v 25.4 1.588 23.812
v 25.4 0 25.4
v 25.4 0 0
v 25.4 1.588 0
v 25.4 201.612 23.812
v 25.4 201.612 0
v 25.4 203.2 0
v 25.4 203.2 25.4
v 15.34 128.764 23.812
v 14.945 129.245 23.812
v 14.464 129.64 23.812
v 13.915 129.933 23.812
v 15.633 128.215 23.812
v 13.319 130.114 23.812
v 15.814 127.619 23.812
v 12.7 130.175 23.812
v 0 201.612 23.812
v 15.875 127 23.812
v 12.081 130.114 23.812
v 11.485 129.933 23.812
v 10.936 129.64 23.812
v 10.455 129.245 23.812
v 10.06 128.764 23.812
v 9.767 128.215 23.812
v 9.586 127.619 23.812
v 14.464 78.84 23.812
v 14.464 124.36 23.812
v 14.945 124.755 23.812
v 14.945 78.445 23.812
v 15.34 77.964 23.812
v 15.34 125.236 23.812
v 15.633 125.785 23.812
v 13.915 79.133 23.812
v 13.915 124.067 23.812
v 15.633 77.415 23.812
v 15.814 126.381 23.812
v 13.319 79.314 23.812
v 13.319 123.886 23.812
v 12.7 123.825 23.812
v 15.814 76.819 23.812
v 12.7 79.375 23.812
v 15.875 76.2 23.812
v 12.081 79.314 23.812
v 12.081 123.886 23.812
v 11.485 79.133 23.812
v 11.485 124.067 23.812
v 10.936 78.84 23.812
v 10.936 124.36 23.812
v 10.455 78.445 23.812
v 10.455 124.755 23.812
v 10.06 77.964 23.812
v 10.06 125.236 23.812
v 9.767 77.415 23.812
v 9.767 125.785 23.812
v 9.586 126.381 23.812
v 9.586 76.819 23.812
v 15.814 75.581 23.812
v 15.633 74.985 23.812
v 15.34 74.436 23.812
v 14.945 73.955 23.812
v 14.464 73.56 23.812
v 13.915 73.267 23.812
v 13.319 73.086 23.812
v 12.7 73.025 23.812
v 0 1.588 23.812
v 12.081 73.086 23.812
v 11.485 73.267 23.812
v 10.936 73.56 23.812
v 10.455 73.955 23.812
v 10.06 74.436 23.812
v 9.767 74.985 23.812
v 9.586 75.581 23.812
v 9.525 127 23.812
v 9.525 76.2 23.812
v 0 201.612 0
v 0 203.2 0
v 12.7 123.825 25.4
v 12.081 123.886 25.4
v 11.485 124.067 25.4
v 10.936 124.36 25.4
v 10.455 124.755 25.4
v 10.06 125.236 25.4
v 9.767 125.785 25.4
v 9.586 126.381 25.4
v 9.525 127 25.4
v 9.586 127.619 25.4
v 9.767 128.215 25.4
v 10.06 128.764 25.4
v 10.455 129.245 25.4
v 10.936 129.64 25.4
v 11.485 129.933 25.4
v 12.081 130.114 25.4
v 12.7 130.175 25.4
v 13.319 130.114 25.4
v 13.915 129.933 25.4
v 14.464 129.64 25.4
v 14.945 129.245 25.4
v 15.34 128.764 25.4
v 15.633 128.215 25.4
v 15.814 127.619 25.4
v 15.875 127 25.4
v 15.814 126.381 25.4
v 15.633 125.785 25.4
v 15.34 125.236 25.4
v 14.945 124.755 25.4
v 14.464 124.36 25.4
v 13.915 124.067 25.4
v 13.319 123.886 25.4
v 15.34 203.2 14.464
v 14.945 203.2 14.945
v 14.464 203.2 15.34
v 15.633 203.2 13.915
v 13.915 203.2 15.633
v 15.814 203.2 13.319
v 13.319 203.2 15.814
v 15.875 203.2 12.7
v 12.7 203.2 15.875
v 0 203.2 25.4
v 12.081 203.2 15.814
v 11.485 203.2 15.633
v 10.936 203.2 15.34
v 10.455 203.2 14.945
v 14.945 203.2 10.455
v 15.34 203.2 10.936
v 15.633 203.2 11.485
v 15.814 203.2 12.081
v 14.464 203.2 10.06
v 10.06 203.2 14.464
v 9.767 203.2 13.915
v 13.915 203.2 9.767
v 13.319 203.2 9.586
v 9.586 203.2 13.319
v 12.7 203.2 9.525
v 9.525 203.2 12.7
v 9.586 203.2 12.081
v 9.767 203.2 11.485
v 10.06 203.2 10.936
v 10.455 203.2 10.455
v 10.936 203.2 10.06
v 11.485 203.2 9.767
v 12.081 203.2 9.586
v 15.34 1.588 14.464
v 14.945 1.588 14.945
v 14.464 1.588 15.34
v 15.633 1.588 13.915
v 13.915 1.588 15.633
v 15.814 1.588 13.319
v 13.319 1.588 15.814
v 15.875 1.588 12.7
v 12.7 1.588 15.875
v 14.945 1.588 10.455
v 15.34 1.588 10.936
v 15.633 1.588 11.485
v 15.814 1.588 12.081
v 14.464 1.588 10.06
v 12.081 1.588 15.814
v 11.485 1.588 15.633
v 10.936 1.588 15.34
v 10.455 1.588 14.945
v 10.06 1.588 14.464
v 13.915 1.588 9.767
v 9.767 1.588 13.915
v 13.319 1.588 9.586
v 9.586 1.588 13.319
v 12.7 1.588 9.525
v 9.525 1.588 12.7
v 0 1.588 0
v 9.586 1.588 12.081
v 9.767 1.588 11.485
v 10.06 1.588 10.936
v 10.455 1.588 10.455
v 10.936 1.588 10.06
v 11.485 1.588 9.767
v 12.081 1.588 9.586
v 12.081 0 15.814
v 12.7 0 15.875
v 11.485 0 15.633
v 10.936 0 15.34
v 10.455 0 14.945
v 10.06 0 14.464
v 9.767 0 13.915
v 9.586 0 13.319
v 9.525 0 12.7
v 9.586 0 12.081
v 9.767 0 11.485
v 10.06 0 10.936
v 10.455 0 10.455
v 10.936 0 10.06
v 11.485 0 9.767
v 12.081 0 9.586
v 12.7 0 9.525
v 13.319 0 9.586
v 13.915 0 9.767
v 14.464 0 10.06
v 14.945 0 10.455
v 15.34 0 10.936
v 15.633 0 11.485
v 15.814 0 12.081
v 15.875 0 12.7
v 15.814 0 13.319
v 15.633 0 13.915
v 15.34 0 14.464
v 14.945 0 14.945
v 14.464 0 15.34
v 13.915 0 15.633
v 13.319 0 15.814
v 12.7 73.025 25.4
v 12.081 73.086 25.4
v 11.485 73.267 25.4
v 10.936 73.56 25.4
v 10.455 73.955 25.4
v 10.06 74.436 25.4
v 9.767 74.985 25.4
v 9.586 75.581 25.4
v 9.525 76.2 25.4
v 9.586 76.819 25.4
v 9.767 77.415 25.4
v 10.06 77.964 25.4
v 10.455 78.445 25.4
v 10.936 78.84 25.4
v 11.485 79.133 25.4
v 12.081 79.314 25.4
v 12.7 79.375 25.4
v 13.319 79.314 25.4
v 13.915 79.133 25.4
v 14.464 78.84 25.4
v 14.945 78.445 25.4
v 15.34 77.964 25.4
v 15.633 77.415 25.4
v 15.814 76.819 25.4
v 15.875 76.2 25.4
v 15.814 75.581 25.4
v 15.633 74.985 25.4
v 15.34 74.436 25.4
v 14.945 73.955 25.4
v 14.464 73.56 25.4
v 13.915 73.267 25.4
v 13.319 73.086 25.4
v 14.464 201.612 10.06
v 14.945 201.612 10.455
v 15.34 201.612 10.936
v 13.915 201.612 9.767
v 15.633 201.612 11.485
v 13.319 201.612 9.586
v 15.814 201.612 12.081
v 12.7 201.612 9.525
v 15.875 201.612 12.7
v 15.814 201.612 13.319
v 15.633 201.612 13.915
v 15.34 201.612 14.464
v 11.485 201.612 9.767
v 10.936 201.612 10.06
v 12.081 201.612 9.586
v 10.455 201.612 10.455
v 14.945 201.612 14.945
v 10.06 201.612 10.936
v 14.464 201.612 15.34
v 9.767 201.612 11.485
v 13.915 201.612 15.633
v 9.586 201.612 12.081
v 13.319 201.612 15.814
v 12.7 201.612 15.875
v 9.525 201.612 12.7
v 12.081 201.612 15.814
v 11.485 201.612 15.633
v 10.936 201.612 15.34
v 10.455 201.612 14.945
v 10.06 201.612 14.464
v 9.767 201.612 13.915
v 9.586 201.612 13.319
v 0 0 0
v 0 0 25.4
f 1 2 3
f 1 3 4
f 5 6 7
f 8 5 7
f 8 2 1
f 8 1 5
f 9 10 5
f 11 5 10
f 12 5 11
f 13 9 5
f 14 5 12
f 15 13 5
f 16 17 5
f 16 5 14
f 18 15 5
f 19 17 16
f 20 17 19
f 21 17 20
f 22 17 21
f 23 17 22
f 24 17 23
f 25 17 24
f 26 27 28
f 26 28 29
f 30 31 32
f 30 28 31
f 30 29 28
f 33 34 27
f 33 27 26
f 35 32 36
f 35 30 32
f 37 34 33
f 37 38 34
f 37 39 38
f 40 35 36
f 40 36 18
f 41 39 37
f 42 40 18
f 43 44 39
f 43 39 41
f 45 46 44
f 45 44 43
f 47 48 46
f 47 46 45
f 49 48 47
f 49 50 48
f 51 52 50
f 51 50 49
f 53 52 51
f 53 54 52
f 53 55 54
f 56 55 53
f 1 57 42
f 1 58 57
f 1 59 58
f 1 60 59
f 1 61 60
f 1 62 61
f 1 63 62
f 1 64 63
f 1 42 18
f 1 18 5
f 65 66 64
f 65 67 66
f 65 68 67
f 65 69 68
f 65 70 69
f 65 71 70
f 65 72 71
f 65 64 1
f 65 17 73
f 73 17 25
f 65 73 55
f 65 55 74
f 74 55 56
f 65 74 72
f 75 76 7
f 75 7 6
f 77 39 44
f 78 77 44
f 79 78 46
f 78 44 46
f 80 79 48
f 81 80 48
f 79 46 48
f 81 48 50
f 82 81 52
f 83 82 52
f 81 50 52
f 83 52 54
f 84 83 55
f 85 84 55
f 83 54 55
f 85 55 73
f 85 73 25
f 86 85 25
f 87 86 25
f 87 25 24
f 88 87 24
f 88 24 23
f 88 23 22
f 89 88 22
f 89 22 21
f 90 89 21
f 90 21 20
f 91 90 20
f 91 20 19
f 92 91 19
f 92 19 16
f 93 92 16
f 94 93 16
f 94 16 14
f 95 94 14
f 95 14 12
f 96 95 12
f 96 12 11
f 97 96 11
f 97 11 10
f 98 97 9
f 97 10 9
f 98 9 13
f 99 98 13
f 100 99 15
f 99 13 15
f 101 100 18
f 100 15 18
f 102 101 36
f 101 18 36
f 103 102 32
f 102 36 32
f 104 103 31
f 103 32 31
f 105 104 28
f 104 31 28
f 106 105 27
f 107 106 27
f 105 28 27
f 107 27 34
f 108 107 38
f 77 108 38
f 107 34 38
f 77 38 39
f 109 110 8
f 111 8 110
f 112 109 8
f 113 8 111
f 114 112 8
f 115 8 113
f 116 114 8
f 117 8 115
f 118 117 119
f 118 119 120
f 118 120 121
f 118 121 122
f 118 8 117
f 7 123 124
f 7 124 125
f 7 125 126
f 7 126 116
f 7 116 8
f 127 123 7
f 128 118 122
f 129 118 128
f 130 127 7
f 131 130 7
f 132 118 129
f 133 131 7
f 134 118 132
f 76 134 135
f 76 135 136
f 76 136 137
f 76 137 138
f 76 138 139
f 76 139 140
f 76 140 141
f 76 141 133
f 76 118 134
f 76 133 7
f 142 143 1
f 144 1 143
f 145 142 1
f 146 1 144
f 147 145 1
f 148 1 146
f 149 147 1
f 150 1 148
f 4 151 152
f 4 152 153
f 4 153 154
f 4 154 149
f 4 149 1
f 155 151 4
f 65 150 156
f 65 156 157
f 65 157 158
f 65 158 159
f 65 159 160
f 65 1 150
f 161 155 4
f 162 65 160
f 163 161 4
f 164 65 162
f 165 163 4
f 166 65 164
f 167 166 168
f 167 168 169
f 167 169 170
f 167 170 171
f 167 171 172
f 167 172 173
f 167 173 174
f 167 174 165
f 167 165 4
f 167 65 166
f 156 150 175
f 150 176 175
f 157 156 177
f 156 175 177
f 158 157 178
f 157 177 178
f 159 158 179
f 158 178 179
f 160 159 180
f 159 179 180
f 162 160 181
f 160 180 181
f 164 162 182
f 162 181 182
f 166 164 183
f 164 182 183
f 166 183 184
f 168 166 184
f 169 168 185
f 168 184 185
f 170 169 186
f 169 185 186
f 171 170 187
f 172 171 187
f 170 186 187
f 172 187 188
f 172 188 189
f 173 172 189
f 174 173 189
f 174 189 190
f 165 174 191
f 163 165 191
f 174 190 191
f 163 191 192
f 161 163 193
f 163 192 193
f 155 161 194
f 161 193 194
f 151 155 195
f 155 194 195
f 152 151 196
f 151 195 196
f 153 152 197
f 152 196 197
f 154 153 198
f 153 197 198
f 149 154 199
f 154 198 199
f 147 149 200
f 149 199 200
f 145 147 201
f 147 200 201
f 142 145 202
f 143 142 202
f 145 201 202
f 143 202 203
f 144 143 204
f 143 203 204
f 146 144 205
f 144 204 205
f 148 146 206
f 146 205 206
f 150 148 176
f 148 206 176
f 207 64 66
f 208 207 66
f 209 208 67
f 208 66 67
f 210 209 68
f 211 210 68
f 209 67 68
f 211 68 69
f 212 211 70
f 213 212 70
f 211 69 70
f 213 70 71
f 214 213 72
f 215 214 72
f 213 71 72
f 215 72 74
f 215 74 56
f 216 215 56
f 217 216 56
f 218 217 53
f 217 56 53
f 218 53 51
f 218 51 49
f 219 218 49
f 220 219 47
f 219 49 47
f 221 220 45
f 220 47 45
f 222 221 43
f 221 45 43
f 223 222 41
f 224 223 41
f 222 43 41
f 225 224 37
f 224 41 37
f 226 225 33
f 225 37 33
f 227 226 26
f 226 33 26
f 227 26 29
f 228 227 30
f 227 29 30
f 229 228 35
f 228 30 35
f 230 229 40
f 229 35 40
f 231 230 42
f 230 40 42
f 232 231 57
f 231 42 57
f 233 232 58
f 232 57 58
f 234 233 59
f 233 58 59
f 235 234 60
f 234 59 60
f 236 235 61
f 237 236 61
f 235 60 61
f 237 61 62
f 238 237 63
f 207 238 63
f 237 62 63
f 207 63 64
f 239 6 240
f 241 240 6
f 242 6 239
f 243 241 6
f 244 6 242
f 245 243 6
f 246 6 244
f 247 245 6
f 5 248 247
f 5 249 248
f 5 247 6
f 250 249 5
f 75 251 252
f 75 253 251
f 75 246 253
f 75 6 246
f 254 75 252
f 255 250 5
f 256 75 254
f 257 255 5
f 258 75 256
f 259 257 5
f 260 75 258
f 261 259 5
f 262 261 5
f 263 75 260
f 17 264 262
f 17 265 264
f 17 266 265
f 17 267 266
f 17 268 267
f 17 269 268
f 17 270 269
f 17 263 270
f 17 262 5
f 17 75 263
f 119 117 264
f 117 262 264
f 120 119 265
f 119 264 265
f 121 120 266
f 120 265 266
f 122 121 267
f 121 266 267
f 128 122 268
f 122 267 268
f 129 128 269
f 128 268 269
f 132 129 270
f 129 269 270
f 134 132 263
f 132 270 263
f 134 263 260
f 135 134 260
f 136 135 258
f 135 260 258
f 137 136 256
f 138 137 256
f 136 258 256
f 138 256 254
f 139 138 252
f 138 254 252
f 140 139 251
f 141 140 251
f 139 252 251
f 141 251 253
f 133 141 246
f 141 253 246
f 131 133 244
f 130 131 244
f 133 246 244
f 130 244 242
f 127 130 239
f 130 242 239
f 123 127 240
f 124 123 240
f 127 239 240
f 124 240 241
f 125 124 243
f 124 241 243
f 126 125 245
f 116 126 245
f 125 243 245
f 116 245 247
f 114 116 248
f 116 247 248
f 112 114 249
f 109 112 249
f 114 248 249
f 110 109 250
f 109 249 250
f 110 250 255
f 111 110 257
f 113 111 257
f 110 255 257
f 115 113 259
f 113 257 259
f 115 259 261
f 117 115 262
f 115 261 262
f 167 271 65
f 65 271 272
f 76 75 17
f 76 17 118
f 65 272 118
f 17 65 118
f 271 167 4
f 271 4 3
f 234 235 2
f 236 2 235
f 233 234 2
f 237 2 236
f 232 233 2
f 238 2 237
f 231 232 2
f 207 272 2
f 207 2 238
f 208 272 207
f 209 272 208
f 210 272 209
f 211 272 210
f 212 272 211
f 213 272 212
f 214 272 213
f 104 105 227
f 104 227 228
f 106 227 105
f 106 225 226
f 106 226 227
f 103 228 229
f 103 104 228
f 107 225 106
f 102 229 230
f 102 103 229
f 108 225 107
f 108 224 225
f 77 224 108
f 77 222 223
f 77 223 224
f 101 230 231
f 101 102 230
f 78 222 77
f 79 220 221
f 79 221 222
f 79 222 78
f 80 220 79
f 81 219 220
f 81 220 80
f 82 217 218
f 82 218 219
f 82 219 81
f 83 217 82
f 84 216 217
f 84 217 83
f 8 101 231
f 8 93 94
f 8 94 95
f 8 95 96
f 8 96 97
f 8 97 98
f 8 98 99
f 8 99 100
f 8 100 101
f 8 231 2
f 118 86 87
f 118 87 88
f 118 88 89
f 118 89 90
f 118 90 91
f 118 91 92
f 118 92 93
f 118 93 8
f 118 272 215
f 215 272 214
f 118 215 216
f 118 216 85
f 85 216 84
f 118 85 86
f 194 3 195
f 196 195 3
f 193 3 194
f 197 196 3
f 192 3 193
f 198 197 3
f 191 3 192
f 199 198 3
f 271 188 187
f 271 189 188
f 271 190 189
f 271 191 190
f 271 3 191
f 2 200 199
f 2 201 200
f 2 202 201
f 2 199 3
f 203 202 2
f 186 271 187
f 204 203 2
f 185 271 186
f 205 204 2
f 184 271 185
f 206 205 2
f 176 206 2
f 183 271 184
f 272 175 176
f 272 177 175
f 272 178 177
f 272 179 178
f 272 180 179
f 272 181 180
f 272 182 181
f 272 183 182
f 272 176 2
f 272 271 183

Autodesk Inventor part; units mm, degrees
ref_plane "YZ Plane" through (0, 0, 0) normal (1, 0, 0) x (0, 1, 0)
ref_plane "XZ Plane" through (0, 0, 0) normal (0, 1, 0) x (-1, 0, 0)
ref_plane "XY Plane" through (0, 0, 0) normal (0, 0, 1) x (1, 0, 0)
sketch "Sketch1" plane through (0, 0, 0) normal (1, 0, 0) x (0, 1, 0)
  line L0 (0, 0) -> (0, 25.4)
  line L1 (0, 25.4) -> (203.2, 25.4)
  line L2 (203.2, 25.4) -> (203.2, 0)
  line L3 (203.2, 0) -> (201.6125, 0)
  line L4 (201.6125, 0) -> (201.6125, 23.8125)
  line L5 (201.6125, 23.8125) -> (1.5875, 23.8125)
  line L6 (1.5875, 23.8125) -> (1.5875, 0)
  line L7 (1.5875, 0) -> (0, 0)
  dimension "d0" = 25.4
  dimension "d1" = 203.2
  dimension "d2" = 1.5875
  dimension "d3" = 1.5875
  dimension "d4" = 1.5875
  dimension "d5" = 25.4
extrude "Extrusion1" add sketch "Sketch1" along normal blind 25.4
sketch "Sketch2" plane through (0, 203.2, 25.4) normal (0, 1, 0) x (1, 0, 0)
  line L0 (25.4, 25.4) -> (25.4, 0) projected
  line L1 (0, 25.4) -> (25.4, 25.4) projected
  point P0 (12.7, 12.7)
  dimension "d8" = 12.7
  dimension "d9" = 12.7
hole "Hole1" at (12.7, 203.2, 12.7) direction (0, -1, 0) diameter 6.35 end through all
sketch "Sketch3" plane through (0, 0, 25.4) normal (0, 0, 1) x (1, 0, 0)
  line L0 (0, 0) -> (0, 203.2) projected
  line L1 (0, 0) -> (25.4, 0) projected
  line L2 (25.4, 203.2) -> (25.4, 0) projected
  line L3 (0, 101.6) -> (25.4, 101.6)
  point P0 (12.7, 127)
  point P1 (12.7, 76.2)
  dimension "d17" = 12.7
  dimension "d18" = 12.7
  dimension "d28" = 101.6
  dimension "d29" = 50.8
  dimension "d30" = 25.4
hole "Hole2" at (12.7, 127, 25.4) at (12.7, 76.2, 25.4) direction (0, 0, -1) diameter 6.35 end through all
properties part number "SupportBAr" material "Aluminum 6061"
